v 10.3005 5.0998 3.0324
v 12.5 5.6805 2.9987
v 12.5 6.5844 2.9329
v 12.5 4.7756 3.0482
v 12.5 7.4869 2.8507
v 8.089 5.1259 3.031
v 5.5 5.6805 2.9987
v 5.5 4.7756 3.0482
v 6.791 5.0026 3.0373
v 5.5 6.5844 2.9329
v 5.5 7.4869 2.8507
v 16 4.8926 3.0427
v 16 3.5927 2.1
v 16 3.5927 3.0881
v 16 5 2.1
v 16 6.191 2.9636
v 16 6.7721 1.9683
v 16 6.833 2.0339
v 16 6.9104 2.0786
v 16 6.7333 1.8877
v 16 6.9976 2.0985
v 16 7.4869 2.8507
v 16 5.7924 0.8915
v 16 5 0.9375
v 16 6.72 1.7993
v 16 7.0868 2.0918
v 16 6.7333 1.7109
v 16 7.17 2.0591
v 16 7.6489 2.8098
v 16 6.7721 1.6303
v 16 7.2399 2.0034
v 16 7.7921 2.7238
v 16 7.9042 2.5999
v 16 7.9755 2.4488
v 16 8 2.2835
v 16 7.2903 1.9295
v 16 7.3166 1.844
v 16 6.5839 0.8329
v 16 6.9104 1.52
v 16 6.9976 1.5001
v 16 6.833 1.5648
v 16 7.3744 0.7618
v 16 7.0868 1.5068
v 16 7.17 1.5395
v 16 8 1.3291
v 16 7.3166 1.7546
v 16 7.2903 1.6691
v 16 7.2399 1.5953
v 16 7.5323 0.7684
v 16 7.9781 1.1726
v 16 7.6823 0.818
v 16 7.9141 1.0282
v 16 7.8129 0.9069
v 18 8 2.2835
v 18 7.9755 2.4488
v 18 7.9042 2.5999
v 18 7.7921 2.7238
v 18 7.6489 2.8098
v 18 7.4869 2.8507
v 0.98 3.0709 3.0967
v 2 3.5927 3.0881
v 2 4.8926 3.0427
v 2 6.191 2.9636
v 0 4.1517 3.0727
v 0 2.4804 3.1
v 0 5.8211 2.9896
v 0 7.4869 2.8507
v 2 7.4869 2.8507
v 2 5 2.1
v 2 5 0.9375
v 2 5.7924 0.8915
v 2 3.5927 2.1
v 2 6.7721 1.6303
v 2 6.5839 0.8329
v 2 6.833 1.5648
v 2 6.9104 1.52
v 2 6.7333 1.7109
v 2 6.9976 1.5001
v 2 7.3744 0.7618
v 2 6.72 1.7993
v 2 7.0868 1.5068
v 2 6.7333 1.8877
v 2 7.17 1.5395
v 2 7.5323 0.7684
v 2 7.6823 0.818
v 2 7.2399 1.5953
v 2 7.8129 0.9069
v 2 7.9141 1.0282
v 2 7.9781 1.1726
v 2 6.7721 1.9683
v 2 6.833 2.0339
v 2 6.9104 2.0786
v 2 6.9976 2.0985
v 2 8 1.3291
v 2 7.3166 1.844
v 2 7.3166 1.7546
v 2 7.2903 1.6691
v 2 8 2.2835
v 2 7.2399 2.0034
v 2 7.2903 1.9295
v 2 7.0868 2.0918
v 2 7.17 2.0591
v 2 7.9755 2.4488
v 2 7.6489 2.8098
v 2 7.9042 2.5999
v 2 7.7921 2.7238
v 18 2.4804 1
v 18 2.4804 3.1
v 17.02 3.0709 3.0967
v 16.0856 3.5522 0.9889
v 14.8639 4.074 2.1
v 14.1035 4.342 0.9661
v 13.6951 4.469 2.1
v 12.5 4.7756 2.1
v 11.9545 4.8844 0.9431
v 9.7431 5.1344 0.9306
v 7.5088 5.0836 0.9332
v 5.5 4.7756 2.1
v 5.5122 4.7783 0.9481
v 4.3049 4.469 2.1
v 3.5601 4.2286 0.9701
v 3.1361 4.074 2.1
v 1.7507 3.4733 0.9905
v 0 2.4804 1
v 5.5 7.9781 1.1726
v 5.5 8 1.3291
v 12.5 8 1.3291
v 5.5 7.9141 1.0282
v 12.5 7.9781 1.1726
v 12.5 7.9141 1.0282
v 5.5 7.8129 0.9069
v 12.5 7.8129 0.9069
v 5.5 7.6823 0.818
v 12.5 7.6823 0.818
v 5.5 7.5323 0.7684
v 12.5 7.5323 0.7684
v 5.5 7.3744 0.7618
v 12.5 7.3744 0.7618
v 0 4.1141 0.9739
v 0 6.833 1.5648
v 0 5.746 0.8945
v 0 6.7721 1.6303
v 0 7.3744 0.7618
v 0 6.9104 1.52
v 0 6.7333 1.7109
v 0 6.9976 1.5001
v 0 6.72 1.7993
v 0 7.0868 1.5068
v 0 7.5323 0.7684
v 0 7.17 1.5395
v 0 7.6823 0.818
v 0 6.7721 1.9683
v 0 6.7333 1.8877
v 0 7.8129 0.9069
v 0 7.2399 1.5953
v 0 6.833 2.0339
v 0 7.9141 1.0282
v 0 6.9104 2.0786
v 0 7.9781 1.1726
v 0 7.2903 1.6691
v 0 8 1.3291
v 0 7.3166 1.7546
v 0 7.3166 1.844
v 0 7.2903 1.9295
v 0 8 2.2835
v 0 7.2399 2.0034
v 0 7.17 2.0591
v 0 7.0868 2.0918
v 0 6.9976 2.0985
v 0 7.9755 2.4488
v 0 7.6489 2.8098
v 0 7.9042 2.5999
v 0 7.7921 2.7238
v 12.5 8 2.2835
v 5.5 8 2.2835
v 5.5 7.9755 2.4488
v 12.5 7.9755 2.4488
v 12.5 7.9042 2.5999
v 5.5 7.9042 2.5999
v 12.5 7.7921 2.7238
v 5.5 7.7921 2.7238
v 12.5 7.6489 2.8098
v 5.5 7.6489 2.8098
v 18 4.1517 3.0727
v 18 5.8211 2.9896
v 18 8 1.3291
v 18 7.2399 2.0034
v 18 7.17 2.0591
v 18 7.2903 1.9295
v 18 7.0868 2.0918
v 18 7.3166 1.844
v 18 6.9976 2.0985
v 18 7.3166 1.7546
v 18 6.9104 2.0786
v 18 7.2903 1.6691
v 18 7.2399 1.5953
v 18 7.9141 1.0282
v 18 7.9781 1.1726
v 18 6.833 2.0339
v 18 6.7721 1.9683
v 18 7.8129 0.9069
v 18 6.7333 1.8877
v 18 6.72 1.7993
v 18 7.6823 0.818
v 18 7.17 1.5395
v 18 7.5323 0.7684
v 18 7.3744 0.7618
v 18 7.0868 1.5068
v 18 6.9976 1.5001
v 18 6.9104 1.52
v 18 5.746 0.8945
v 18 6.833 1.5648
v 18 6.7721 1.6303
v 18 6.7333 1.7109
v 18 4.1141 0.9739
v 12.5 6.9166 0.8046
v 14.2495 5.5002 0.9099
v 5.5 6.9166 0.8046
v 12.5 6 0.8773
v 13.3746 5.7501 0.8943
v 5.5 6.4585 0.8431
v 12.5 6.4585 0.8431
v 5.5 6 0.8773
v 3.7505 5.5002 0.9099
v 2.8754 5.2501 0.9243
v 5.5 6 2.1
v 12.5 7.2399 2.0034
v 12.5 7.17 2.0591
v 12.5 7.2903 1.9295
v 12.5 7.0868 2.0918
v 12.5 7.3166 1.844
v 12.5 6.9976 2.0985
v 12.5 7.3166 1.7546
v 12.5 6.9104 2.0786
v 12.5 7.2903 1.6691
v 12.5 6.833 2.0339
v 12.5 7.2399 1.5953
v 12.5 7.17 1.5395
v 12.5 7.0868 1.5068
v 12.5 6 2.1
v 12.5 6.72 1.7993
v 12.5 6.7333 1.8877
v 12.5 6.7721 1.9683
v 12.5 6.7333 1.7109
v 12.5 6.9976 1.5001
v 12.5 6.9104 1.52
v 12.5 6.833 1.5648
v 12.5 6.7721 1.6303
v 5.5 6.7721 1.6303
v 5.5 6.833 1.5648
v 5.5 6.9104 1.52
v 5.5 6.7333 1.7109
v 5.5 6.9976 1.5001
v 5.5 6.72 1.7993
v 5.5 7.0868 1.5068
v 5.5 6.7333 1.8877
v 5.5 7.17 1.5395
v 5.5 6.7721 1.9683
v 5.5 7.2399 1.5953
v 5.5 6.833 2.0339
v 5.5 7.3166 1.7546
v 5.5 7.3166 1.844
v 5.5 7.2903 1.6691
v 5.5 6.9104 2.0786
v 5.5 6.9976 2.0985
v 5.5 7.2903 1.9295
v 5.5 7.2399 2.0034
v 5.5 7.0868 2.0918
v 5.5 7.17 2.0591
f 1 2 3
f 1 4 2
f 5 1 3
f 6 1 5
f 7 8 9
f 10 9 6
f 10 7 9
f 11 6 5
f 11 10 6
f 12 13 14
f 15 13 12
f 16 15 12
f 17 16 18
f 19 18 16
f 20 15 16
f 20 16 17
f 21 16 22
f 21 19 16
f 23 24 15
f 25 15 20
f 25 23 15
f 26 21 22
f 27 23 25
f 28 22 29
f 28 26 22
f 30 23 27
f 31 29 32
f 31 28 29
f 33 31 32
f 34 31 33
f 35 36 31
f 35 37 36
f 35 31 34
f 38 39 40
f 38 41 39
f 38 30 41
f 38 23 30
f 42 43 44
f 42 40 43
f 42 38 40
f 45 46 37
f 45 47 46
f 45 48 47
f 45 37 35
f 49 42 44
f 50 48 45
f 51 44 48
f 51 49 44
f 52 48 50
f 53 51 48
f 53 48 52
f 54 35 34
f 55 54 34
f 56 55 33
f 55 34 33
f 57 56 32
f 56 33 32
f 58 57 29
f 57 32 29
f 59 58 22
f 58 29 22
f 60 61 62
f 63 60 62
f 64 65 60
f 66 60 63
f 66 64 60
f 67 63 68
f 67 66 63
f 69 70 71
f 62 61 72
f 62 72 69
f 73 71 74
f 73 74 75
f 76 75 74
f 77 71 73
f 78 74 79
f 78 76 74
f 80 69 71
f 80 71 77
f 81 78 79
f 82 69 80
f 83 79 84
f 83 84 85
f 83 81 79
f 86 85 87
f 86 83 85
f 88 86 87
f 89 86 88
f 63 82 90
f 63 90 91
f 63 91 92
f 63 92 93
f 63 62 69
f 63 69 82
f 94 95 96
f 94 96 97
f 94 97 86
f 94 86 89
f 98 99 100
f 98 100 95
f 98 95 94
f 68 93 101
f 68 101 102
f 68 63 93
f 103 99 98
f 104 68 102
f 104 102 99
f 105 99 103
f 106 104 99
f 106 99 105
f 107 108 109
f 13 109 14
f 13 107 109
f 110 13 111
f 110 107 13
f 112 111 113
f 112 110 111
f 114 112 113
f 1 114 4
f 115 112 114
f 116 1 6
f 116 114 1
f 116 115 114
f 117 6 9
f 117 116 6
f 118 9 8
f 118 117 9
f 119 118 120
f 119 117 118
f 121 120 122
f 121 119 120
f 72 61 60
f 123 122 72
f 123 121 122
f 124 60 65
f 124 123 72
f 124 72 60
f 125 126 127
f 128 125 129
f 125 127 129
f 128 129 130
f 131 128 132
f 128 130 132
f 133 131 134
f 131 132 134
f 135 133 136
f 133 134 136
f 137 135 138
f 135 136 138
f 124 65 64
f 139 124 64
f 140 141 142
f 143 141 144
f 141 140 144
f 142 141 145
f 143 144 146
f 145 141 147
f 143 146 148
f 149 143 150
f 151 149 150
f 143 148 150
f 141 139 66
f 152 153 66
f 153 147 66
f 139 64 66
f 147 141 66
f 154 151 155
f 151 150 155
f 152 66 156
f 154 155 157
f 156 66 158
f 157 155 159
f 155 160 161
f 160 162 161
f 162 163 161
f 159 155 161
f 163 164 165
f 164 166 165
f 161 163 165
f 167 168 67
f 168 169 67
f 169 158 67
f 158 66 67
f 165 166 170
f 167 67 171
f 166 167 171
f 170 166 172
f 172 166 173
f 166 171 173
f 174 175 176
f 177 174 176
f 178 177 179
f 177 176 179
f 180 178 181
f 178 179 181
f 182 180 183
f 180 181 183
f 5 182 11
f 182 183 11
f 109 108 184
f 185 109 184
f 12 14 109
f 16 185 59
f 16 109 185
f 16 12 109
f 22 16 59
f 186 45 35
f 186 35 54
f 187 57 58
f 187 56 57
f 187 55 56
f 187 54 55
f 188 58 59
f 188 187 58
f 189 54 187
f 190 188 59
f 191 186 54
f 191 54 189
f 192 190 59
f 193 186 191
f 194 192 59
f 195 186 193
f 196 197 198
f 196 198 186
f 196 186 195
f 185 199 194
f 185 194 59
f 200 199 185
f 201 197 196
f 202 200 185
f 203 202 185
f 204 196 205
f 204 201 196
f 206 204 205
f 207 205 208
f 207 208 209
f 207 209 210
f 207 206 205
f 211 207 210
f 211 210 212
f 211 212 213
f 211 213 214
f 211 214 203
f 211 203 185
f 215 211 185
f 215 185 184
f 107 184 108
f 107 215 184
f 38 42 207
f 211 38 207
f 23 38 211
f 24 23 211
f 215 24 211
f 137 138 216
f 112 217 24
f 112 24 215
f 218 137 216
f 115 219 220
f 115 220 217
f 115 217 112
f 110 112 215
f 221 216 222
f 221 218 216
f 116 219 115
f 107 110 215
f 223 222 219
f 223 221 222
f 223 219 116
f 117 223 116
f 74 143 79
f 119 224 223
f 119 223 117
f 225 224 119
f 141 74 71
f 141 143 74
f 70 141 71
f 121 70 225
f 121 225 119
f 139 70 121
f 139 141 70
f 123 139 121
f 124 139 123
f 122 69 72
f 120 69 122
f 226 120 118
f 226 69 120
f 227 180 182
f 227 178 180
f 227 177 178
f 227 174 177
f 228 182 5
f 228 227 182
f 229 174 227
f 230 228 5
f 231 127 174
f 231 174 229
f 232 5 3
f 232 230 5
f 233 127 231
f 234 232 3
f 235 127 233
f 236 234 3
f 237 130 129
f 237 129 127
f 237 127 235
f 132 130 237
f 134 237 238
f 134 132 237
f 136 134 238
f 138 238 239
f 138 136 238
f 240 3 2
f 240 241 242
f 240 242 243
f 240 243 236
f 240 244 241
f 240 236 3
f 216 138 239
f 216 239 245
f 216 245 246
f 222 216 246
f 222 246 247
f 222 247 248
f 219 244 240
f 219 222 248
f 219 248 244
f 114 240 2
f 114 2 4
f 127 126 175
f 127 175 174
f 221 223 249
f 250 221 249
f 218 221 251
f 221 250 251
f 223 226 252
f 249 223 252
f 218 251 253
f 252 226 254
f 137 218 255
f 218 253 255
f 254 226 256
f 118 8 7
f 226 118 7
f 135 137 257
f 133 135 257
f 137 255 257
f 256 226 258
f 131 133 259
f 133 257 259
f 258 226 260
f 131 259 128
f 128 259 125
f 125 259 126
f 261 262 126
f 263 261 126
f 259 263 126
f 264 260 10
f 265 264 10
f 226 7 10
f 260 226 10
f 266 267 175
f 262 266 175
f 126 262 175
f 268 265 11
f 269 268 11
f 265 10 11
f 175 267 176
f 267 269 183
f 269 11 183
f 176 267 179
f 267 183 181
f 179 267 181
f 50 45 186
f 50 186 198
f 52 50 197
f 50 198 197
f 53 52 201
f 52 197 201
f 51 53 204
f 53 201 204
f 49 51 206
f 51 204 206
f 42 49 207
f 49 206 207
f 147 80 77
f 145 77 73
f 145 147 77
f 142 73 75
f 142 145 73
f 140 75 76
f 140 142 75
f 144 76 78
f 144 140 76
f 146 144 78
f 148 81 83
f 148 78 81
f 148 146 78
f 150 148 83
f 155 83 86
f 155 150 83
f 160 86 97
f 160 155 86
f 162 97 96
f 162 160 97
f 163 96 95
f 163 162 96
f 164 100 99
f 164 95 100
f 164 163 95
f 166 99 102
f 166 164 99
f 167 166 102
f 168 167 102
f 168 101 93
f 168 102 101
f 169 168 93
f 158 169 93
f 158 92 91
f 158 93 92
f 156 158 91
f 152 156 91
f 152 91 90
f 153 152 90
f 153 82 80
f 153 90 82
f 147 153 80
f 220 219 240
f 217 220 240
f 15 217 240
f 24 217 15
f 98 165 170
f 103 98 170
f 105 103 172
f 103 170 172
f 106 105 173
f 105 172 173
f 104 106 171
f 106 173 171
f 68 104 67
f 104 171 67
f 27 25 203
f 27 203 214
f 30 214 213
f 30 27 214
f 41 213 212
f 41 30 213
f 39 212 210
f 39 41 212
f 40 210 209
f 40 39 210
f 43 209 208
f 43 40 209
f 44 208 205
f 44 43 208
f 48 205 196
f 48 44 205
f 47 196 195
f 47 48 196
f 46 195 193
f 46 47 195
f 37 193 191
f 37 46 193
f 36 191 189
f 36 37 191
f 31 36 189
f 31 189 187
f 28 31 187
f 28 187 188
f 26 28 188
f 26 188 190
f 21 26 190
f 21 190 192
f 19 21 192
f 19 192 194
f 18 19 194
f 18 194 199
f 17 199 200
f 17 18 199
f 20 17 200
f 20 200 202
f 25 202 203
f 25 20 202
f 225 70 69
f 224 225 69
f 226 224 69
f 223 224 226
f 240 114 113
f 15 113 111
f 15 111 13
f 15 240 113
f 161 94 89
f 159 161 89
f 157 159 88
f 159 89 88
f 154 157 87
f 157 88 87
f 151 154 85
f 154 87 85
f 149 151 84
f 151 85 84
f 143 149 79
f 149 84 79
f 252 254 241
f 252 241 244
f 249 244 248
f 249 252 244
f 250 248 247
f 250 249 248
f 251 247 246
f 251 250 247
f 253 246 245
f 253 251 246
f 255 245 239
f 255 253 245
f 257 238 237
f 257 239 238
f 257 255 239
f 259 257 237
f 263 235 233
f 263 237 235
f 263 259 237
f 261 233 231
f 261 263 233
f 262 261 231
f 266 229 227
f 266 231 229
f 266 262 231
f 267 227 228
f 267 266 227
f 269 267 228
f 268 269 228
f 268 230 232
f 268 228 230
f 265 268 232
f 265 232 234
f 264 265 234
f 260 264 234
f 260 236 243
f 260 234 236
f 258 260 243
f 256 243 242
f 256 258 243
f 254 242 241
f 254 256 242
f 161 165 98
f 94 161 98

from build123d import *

# Parameters (mm, degrees)
BOSS_EXTRUDE2_DEPTH = 5
SKETCH8_R           = 50
CUT_EXTRUDE6_DEPTH  = 20
SKETCH9_OUTSIDE_W   = 10.609
SKETCH9_OUTSIDE_H   = 17.306
SKETCH9_OUTSIDE_R   = 50
CUT_EXTRUDE7_DEPTH  = 20
SKETCH11_W          = 2
SKETCH11_H          = 8
SKETCH11_W_2        = 7
BOSS_EXTRUDE4_DEPTH = 2
CUT_EXTRUDE8_DEPTH  = 18
SKETCH13_R          = 0.3
CUT_EXTRUDE10_DEPTH = 20.940160481
SKETCH14_R          = 0.3
CUT_EXTRUDE11_DEPTH = 20
FILLET1_R           = 0.57
SKETCH15_R          = 16.5
CUT_EXTRUDE12_DEPTH = 20.940160481
SKETCH16_W          = 3.5
SKETCH16_H          = 4.171301815
SKETCH16_H_2        = 4.584730653
CUT_EXTRUDE14_DEPTH = 3.5


# Read off the part's stored shape, not the designer's step: Cut-Extrude8
with BuildPart() as part:
    # Sketch1 → Boss-Extrude2 (new body)
    with BuildSketch(Plane.XY):
        Polygon((0, 0), (0, 8), (2, 8), (2, 5), (5.5, 6), (5.5, 8), (12.5, 8), (12.5, 6), (16, 5), (16, 8), (18, 8), (18, 0), (16, 0), (16, -3), (12.5, -2), (12.5, 0), (5.5, 0), (5.5, -2), (2, -3), (2, 0), align=None)
    extrude(amount=BOSS_EXTRUDE2_DEPTH)

    # Sketch8 → Cut-Extrude6 (cut)
    with BuildSketch(Plane(origin=(0, 0, 0), x_dir=(0, 0, -1), z_dir=(1, 0, 0))):
        with Locations((49, 2.5)):
            Circle(SKETCH8_R)
    extrude(amount=CUT_EXTRUDE6_DEPTH, mode=Mode.SUBTRACT)

    # Sketch9 outside → Cut-Extrude7 (cut)
    with BuildSketch(Plane(origin=(0, 0, 0), x_dir=(0, 0, -1), z_dir=(1, 0, 0))):
        with Locations((-2.8485, 2.5)):
            Rectangle(SKETCH9_OUTSIDE_W, SKETCH9_OUTSIDE_H)
        with Locations((47.1, 2.5)):
            Circle(SKETCH9_OUTSIDE_R, mode=Mode.SUBTRACT)
    extrude(amount=CUT_EXTRUDE7_DEPTH, mode=Mode.SUBTRACT)

    # Sketch11 → Boss-Extrude4 (add)
    with BuildSketch(Plane.XY.offset(4)):
        with Locations((1, 4)):
            Rectangle(SKETCH11_W, SKETCH11_H)
        with Locations((9, 4)):
            Rectangle(SKETCH11_W_2, SKETCH11_H)
        with Locations((17, 4)):
            Rectangle(SKETCH11_W, SKETCH11_H)
    extrude(amount=-BOSS_EXTRUDE4_DEPTH)

    # Cut-Extrude8 outline → Cut-Extrude8 (cut)
    with BuildSketch(Plane(origin=(0, 0, 0), x_dir=(0, 0, -1), z_dir=(1, 0, 0))):
        with BuildLine():
            Line((-4, 0), (-3.037460889, 0))
            ThreePointArc((-3.037460889, 0), (-3.07734981, 4.004827558), (-2.796579359, 8))
            Line((-2.796579359, 8), (-4, 8))
            Line((-4, 8), (-4, 0))
        make_face()
    extrude(amount=CUT_EXTRUDE8_DEPTH, mode=Mode.SUBTRACT)

    # Sketch13 → Cut-Extrude10 (cut, through all)
    with BuildSketch(Plane(origin=(0, 0, 0), x_dir=(0, 0, -1), z_dir=(1, 0, 0))):
        with Locations(Location((-1.799307082, 7.02, 0), (0, 0, 270))):
            Circle(SKETCH13_R)
    extrude(amount=CUT_EXTRUDE10_DEPTH, mode=Mode.SUBTRACT)

    # Sketch14 → Cut-Extrude11 (cut)
    with BuildSketch(Plane(origin=(0, 0, 0), x_dir=(0, 0, -1), z_dir=(1, 0, 0))):
        with Locations(Location((-1.865607241, -1.2, 0), (0, 0, 270))):
            Circle(SKETCH14_R)
    extrude(amount=CUT_EXTRUDE11_DEPTH, mode=Mode.SUBTRACT)

    # Fillet1
    # the kernel refuses this fillet: 0.57 mm, written as the material it takes off along each edge
    with BuildSketch(Plane(origin=(16, 0, 3.037460889), x_dir=(0, 0, -1), z_dir=(1, 0, 0))) as fillet1_piece_1:
        with BuildLine():
            CenterArc((0.545153795, 0.57), FILLET1_R, 182.237689069, 87.762310931)
            ThreePointArc((-0.02441155, 0.547744285), (-0.012956585, 0.273838681), (0, 0))
            Line((0, 0), (0.545153795, 0))
        make_face()
    extrude(amount=3.370719987, mode=Mode.SUBTRACT)
    with BuildSketch(Plane(origin=(14.71001217, 8, 2.796579359), x_dir=(0, 0, -1), z_dir=(1, 0, 0)), Plane(origin=(-1.28998783, 8, 2.796579359), x_dir=(0, 0, -1), z_dir=(1, 0, 0))) as fillet1_piece_2:
        with BuildLine():
            CenterArc((0.513045529, -0.57), FILLET1_R, 90, 84.275973917)
            ThreePointArc((-0.054112356, -0.513149909), (-0.02771814, -0.25650515), (0, 0))
            Line((0, 0), (0.513045529, 0))
        make_face()
    extrude(amount=4.57997566, mode=Mode.SUBTRACT)
    with BuildSketch(Plane(origin=(5.5, 0, 3.037460889), x_dir=(0, 0, -1), z_dir=(1, 0, 0))) as fillet1_piece_3:
        with BuildLine():
            CenterArc((0.545153795, 0.57), FILLET1_R, 182.237689069, 87.762310931)
            ThreePointArc((-0.02441155, 0.547744285), (-0.012956585, 0.273838681), (0, 0))
            Line((0, 0), (0.545153795, 0))
        make_face()
    extrude(amount=7, mode=Mode.SUBTRACT)
    with BuildSketch(Plane(origin=(4.21001217, 8, 2.796579359), x_dir=(0, 0, -1), z_dir=(1, 0, 0))) as fillet1_piece_4:
        with BuildLine():
            CenterArc((0.513045529, -0.57), FILLET1_R, 90, 84.275973917)
            ThreePointArc((-0.054112356, -0.513149909), (-0.02771814, -0.25650515), (0, 0))
            Line((0, 0), (0.513045529, 0))
        make_face()
    extrude(amount=9.57997566, mode=Mode.SUBTRACT)
    with BuildSketch(Plane(origin=(-1.370719987, 0, 3.037460889), x_dir=(0, 0.9990083494743675, 0.044523226303807895), z_dir=(1, 0, 0))) as fillet1_piece_5:
        with BuildLine():
            CenterArc((0.545162753, -0.569991432), FILLET1_R, 89.685852545, 87.762310931)
            Line((-0.024272006, -0.544613193), (0, 0))
            ThreePointArc((0, 0), (0.274143997, 0.000751555), (0.548287995, 0))
        make_face()
    extrude(amount=3.370719987, mode=Mode.SUBTRACT)
    with BuildSketch(Plane(origin=(2, 0, 0.937460889), x_dir=(0, 0.9990278617443559, 0.04408323330360469), z_dir=(-1, 0, 0)), Plane(origin=(19.489241357, 0, 0.937460889), x_dir=(0, 0.9990278617443559, 0.04408323330360409), z_dir=(-1, 0, 0))) as fillet1_piece_6:
        with BuildLine():
            CenterArc((0.595706111, -0.569990001), FILLET1_R, 90.339381978, 92.187220026)
            Line((0.02626023, -0.595117444), (0, 0))
            ThreePointArc((0, 0), (0.296164915, -0.000877144), (0.592329831, 0))
        make_face()
    extrude(amount=3.489241357, mode=Mode.SUBTRACT)
    with BuildSketch(Plane(origin=(3.581343655, 8, 0.696579359), x_dir=(0, 0, 1), z_dir=(-1, 0, 0))) as fillet1_piece_7:
        with BuildLine():
            CenterArc((0.632537462, -0.57), FILLET1_R, 90, 95.594572842)
            ThreePointArc((0.065252578, -0.625568519), (0.033609947, -0.312681655), (0, 0))
            Line((0, 0), (0.632537462, 0))
        make_face()
    extrude(amount=5.16268731, mode=Mode.SUBTRACT)
    with BuildSketch(Plane(origin=(14.081343655, 8, 0.696579359), x_dir=(0, -0.9946037861150897, 0.1037463669027923), z_dir=(-1, 0, 0))) as fillet1_piece_8:
        with BuildLine():
            CenterArc((0.632547622, 0.569988725), FILLET1_R, 174.045055794, 95.594572842)
            Line((0.065623464, 0.629124155), (0, 0))
            ThreePointArc((0, 0), (0.314481268, 0.000988994), (0.628962535, 0))
        make_face()
    extrude(amount=10.16268731, mode=Mode.SUBTRACT)
    with BuildSketch(Plane(origin=(19.581343655, 8, 0.696579359), x_dir=(0, -0.9946037861150897, 0.1037463669027923), z_dir=(-1, 0, 0))) as fillet1_piece_9:
        with BuildLine():
            CenterArc((0.632547622, 0.569988725), FILLET1_R, 174.045055794, 95.594572842)
            Line((0.065623464, 0.629124155), (0, 0))
            ThreePointArc((0, 0), (0.314481268, 0.000988994), (0.628962535, 0))
        make_face()
    extrude(amount=5.16268731, mode=Mode.SUBTRACT)
    with BuildSketch(Plane(origin=(12.5, 0, 0.937460889), x_dir=(0, 0.9990278617443559, 0.04408323330360469), z_dir=(-1, 0, 0))) as fillet1_piece_10:
        with BuildLine():
            CenterArc((0.595706111, -0.569990001), FILLET1_R, 90.339381978, 92.187220026)
            Line((0.02626023, -0.595117444), (0, 0))
            ThreePointArc((0, 0), (0.296164915, -0.000877144), (0.592329831, 0))
        make_face()
    extrude(amount=7, mode=Mode.SUBTRACT)

    # Sketch15 → Cut-Extrude12 (cut, through all)
    with BuildSketch(Plane.XY):
        with Locations((9, -11.34889303)):
            Circle(SKETCH15_R)
    extrude(amount=CUT_EXTRUDE12_DEPTH, mode=Mode.SUBTRACT)

    # Sketch16 → Cut-Extrude14 (cut)
    with BuildSketch(Plane.XY.offset(5.6)):
        with Locations((3.75, 4.184345942)):
            Rectangle(SKETCH16_W, SKETCH16_H)
        with Locations((14.25, 4.391060361)):
            Rectangle(SKETCH16_W, SKETCH16_H_2)
    extrude(amount=-CUT_EXTRUDE14_DEPTH, mode=Mode.SUBTRACT)


solid = part.part
